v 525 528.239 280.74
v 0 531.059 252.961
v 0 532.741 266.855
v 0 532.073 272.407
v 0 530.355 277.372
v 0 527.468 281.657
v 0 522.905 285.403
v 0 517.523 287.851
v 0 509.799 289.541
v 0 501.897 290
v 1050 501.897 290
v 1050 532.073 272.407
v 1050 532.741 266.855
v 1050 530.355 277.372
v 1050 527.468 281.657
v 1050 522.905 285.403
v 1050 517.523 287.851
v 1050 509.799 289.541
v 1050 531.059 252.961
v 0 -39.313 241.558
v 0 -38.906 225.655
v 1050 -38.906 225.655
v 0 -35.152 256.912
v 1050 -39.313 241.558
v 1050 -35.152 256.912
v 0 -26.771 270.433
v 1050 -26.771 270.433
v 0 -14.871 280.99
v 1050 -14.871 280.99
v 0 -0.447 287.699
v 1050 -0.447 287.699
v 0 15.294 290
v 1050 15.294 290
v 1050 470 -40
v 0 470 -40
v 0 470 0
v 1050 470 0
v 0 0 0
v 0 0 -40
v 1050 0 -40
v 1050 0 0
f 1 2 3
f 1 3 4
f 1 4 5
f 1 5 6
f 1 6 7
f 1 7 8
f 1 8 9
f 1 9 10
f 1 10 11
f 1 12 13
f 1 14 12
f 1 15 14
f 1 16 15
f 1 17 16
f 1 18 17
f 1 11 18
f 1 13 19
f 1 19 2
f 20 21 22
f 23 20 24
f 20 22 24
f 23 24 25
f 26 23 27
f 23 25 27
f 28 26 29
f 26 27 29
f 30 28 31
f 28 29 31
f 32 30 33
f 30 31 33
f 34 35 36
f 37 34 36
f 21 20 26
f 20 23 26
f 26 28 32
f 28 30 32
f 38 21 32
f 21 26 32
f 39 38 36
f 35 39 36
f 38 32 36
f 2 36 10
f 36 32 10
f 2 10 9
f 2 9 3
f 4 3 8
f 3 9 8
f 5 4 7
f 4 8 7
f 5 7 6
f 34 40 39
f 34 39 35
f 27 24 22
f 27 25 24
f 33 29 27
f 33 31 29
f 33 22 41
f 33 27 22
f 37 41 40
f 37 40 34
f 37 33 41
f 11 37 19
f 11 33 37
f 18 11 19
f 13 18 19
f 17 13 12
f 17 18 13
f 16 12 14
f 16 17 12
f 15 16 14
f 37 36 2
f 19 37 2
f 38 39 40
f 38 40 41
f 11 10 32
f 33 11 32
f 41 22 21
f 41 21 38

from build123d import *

# Parameters (mm, degrees)
F0_W        = 470
F0_H        = 40
F1_DEPTH    = 1050
F2_R        = 55
F3_T1_DEPTH = 1240.5148333467


# Not quite as in the source:
# - a fillet or chamfer that OpenCascade refuses, or shapes differently, is made with other operations: its cross-section is extruded or revolved along the edge and cut away or added


with BuildPart() as f1:
    # F0 (on Right) → F1 (new body)
    with BuildSketch(Plane.YZ):
        Polygon((-50, 290), (0, 0), (470, 0), (540, 290), (470, 290), align=None)
        with Locations((235, -20)):
            Rectangle(F0_W, F0_H)
    extrude(amount=F1_DEPTH)

    # F2
    f2_edges = [f1.edges().sort_by_distance(p)[0] for p in [
        (525, -50, 290),
    ]]
    fillet(f2_edges, radius=F2_R)

    # F3: fillet of radius 30 on 1 edges, made by hand

    # F3_s2 → F3_t1 (cut)
    with BuildSketch(Plane.YZ.offset(-95.2574166733)):
        with BuildLine():
            add(Edge.make_bspline(
                [(501.8970333307, 290), (540, 290), (531.0594995879, 252.9607840069)],
                knots=[0, 0, 0, 1, 1, 1], degree=2, weights=[1, 1, 1]))
            Line((531.0594995879, 252.9607840069), (540, 290))
            Line((540, 290), (501.8970333307, 290))
        make_face()
    extrude(amount=F3_T1_DEPTH, mode=Mode.SUBTRACT)


solid = f1.part
